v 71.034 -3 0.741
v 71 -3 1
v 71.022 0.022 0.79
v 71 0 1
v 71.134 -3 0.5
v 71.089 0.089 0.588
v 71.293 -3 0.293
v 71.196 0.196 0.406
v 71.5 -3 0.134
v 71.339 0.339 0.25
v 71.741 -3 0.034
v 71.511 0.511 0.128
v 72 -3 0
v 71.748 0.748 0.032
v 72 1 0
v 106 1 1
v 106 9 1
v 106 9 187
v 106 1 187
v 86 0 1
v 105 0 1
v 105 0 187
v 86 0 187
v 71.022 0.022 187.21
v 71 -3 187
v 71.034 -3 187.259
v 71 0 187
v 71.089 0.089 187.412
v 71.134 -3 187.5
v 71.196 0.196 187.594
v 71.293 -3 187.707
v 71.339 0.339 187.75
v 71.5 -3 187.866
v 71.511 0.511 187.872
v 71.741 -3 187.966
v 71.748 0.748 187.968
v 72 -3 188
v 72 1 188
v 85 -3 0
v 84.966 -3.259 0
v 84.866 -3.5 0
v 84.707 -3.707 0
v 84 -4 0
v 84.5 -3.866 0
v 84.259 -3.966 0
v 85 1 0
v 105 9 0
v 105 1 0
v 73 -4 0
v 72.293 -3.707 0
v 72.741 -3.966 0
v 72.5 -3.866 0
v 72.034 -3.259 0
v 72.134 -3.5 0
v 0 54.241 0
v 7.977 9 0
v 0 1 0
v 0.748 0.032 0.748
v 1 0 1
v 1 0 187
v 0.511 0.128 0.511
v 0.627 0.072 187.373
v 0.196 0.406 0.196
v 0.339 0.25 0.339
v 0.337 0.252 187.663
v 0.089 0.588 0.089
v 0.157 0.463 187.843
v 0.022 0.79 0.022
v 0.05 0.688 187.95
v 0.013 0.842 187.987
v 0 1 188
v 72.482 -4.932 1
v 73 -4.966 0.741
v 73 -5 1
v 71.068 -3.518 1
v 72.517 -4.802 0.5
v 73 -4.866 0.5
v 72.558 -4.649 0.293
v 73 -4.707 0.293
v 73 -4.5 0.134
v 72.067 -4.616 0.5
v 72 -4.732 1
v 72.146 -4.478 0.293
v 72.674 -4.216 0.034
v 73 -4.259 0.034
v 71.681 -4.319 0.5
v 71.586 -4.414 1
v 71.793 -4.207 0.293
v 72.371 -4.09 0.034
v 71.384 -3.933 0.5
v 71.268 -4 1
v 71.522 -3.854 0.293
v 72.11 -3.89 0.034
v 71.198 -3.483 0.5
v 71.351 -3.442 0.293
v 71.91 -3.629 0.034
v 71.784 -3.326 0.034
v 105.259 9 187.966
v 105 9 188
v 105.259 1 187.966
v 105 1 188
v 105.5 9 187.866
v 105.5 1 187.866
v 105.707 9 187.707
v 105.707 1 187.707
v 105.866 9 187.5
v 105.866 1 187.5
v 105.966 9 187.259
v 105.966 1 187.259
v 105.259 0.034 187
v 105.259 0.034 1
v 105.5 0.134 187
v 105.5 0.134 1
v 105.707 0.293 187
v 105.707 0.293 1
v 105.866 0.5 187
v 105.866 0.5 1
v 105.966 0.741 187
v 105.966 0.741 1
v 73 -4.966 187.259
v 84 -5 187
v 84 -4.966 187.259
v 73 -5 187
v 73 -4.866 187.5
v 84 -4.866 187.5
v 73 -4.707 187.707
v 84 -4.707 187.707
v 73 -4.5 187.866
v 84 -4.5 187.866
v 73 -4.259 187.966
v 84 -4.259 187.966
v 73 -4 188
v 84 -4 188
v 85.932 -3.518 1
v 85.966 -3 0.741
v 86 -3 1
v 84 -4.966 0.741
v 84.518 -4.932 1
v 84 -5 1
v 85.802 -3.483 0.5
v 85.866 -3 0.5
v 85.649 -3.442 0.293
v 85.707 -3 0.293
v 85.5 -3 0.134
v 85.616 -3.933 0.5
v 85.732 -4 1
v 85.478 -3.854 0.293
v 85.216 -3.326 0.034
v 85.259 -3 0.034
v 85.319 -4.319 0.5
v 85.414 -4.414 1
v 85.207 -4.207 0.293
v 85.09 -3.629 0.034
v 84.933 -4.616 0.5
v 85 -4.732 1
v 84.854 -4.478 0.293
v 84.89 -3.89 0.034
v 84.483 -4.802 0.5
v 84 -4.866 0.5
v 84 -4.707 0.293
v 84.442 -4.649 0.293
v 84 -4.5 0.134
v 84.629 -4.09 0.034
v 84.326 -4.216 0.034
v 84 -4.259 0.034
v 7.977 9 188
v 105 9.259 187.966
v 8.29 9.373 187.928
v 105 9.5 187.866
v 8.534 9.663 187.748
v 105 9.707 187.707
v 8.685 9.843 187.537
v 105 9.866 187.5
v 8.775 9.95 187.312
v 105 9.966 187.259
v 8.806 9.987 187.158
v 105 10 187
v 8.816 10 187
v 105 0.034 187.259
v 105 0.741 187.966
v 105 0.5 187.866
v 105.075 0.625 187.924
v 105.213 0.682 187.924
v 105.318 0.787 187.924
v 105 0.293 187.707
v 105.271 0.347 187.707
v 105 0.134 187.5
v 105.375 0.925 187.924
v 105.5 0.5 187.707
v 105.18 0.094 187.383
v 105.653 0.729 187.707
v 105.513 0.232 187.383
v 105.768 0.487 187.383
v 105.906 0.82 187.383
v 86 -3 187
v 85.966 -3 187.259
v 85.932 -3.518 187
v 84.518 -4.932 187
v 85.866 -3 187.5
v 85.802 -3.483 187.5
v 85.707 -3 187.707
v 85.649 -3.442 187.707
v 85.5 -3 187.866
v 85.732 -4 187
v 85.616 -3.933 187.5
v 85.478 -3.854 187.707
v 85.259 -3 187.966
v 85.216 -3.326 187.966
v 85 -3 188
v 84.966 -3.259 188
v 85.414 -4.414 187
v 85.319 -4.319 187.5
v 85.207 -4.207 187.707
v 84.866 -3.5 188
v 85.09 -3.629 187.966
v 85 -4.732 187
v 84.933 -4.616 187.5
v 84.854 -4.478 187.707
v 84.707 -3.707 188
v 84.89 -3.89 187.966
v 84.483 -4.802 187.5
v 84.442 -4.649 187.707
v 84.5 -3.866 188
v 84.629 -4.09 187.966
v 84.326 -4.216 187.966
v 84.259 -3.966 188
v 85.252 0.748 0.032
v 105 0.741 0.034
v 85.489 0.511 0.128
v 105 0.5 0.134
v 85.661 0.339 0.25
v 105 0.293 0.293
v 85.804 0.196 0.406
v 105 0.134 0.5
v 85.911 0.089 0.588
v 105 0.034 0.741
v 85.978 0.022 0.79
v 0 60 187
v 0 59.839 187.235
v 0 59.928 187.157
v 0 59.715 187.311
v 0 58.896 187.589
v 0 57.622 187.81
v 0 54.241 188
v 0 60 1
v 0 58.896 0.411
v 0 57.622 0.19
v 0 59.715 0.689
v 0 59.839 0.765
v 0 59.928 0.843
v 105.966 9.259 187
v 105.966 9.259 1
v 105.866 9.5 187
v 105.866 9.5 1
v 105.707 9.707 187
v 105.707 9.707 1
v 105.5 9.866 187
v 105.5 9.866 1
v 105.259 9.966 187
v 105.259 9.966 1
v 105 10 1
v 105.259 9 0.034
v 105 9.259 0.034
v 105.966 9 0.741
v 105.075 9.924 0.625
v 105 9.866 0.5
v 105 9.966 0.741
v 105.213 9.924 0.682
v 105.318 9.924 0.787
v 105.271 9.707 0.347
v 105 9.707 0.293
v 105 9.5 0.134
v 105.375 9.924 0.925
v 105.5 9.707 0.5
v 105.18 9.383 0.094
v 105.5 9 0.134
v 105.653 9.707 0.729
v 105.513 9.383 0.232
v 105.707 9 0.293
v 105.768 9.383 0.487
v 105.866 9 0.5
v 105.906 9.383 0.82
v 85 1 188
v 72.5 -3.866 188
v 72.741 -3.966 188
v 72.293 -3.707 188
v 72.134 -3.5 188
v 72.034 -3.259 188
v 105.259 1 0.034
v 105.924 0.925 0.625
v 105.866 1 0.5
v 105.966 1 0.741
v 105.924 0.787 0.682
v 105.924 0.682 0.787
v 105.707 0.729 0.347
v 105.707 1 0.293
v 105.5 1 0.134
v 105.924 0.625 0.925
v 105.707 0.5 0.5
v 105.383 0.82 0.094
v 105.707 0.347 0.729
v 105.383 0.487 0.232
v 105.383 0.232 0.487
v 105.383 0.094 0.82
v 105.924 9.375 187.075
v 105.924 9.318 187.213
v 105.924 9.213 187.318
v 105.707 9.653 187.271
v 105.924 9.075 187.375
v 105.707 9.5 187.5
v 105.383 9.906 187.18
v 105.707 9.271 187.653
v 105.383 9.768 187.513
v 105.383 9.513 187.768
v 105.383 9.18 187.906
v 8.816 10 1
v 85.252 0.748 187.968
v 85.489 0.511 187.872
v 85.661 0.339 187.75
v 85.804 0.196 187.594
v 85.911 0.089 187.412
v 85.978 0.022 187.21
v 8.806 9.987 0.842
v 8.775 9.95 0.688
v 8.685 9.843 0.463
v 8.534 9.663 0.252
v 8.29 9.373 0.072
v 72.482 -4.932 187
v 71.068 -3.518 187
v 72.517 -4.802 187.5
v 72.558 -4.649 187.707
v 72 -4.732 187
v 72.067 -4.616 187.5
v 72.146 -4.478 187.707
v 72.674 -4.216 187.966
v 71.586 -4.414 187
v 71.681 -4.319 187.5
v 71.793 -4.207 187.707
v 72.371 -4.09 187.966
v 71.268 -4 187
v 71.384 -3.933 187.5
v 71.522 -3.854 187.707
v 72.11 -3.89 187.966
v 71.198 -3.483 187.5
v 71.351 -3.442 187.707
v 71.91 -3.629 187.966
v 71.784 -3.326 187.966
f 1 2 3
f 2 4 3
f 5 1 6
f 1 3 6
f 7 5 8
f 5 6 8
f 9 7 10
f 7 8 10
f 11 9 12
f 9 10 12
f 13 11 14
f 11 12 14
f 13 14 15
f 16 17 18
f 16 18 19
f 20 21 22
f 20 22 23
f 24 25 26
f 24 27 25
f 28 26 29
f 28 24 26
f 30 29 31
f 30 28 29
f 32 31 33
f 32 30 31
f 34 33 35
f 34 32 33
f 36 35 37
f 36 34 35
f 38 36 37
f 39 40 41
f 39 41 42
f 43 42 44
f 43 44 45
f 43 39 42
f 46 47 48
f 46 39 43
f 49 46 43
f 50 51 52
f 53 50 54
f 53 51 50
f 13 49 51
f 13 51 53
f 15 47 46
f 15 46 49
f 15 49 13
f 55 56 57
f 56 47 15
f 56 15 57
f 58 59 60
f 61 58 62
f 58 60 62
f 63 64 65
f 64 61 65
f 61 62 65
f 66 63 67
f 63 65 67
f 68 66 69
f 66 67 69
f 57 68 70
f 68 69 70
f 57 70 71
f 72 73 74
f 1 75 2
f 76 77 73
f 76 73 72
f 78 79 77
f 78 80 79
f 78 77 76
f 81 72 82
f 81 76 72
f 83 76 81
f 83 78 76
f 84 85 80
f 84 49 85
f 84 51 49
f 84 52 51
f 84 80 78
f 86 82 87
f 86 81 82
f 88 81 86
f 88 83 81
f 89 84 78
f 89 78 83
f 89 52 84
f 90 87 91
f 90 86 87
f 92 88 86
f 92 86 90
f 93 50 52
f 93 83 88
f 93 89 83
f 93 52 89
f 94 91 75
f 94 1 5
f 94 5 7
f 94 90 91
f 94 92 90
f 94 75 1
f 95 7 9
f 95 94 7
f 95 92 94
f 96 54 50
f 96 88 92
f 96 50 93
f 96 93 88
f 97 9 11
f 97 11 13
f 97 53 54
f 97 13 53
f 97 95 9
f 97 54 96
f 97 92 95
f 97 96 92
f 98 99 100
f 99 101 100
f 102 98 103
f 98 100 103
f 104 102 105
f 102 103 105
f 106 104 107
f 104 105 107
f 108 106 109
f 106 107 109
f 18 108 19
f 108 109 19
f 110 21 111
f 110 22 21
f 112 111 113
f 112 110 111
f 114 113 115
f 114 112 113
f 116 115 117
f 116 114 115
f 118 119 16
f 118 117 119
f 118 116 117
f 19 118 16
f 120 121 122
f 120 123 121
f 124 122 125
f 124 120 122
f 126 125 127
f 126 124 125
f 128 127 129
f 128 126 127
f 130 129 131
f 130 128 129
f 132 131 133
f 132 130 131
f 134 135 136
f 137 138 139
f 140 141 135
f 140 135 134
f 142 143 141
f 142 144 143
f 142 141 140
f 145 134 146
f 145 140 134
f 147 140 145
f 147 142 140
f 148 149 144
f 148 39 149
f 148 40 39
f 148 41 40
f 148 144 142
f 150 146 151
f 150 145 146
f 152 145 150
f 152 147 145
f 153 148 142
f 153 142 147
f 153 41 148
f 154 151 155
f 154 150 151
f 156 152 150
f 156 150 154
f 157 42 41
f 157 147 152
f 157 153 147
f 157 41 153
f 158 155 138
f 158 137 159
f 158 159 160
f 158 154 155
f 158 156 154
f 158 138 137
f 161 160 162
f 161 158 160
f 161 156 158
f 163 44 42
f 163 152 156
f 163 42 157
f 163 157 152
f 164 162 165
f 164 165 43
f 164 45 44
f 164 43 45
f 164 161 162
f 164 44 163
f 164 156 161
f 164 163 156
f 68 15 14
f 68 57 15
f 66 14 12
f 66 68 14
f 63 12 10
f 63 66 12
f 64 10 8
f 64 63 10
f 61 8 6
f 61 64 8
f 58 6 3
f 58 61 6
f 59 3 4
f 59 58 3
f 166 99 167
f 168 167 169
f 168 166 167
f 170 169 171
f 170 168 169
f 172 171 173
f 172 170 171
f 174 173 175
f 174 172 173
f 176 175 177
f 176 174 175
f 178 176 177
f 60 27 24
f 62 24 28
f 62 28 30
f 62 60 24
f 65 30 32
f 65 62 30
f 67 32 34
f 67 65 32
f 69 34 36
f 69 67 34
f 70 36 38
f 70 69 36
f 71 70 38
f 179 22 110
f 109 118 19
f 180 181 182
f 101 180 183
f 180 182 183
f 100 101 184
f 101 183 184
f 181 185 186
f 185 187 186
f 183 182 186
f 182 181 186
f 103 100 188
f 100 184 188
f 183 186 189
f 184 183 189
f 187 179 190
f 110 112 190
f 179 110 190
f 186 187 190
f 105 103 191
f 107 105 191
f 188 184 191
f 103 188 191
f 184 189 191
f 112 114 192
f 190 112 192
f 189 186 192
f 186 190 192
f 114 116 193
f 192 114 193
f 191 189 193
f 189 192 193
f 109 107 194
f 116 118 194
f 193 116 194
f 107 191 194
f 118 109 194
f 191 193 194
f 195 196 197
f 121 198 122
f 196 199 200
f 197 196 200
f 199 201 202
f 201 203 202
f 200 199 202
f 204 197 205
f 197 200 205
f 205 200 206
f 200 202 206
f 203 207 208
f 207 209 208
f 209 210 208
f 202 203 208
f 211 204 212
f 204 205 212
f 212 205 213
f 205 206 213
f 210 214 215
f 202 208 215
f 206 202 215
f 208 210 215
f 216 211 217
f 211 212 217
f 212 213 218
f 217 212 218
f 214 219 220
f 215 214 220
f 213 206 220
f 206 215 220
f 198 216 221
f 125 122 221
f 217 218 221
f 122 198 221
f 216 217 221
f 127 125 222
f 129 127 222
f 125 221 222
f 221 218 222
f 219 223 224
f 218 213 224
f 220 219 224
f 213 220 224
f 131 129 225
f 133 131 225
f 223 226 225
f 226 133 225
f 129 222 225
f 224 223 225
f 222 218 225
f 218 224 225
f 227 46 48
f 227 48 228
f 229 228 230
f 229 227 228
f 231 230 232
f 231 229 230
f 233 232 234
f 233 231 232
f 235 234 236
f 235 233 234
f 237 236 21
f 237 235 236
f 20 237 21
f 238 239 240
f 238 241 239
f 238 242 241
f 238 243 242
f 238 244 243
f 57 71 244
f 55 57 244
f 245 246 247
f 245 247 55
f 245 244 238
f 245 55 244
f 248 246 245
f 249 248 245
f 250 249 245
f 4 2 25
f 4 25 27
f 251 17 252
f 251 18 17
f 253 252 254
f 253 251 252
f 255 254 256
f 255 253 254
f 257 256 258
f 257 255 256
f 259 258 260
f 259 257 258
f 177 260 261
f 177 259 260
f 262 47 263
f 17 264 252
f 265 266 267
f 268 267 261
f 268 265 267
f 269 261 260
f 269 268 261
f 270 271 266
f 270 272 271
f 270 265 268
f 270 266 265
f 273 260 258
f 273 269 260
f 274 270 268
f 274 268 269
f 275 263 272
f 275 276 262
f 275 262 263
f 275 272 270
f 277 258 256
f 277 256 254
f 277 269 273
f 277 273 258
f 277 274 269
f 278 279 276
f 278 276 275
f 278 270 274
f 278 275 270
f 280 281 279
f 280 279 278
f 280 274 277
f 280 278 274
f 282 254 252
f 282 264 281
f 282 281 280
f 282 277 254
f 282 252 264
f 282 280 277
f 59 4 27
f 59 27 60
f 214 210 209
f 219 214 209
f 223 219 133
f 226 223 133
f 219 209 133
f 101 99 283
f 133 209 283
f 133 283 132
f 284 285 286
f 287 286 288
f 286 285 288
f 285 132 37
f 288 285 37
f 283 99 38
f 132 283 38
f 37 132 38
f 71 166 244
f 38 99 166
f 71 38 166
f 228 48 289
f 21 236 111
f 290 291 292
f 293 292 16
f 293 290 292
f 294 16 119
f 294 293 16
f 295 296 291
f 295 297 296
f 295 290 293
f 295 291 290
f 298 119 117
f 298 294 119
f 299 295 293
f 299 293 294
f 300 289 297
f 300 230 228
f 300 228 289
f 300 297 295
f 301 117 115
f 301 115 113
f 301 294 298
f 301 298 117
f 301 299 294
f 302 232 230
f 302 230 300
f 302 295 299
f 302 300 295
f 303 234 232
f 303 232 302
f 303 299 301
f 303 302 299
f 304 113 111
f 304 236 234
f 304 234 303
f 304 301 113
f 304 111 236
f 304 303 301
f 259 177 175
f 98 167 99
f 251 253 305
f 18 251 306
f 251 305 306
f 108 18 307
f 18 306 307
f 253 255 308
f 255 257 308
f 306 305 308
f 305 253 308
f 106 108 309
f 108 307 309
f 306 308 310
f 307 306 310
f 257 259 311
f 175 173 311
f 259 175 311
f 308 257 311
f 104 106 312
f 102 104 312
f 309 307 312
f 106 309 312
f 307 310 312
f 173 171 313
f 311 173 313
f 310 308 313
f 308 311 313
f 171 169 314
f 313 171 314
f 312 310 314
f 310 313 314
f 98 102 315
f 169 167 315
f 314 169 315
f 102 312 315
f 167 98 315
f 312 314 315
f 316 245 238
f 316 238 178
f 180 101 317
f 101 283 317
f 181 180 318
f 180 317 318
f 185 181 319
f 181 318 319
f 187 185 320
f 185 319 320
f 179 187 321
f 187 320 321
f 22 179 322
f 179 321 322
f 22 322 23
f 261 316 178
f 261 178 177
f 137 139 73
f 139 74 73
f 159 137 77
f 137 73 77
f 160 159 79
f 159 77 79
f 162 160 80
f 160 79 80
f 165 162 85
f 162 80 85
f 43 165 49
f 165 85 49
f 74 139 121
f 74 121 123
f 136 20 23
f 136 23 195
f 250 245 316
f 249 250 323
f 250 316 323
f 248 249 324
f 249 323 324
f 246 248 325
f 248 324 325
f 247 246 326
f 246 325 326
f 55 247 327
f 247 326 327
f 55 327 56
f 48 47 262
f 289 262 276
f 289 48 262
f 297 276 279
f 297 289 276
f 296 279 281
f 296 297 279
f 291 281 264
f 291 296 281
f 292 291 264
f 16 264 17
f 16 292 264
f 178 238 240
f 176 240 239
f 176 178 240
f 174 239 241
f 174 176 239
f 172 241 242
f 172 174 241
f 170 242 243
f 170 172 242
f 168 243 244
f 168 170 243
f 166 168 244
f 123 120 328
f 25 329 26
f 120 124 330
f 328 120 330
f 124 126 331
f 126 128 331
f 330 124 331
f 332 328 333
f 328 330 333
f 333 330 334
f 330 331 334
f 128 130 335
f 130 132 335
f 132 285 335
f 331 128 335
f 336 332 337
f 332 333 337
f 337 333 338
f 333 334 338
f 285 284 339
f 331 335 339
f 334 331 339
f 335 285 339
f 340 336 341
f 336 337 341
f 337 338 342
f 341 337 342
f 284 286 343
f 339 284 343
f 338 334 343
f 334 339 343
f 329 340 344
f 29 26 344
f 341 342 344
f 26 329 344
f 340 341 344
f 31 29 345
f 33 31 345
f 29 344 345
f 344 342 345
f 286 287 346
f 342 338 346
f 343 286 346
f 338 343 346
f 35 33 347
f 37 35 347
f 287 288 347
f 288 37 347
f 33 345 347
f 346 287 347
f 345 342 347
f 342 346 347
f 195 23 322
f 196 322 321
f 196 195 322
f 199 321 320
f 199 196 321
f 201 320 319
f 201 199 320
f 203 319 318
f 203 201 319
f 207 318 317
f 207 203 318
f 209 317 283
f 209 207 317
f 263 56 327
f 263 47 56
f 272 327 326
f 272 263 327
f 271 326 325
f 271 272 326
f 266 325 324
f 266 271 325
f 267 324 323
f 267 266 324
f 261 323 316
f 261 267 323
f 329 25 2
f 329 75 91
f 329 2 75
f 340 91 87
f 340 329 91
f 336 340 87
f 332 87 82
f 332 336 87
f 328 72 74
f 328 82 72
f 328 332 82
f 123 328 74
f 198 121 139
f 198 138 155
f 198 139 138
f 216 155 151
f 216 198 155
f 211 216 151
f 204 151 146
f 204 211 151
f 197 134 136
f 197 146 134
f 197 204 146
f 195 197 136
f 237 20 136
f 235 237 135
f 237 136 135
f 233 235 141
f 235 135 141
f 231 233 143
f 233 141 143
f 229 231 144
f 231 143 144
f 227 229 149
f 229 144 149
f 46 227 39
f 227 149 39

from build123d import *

# Parameters (mm, degrees)
EXTRUDE_DEPTH = 188
FILLET_R      = 1
FILLET001_R   = 2
FILLET002_R   = 1


with BuildPart() as part:
    # Sketch → Extrude (new body)
    with BuildSketch(Plane.XY):
        Polygon((0, 0), (0, 60), (8.816349, 10), (106, 10), (106, 0), (86, 0), (86, -5), (71, -5), (71, 0), align=None)
    extrude(amount=EXTRUDE_DEPTH)

    # Fillet
    fillet_edges = [part.edges().sort_by_distance(p)[0] for p in [
        (4.408175, 35, 0),
        (4.408175, 35, 188),
    ]]
    fillet(fillet_edges, radius=FILLET_R)

    # Fillet001
    fillet001_edges = [part.edges().sort_by_distance(p)[0] for p in [
        (71, -5, 94),
        (86, -5, 94),
    ]]
    fillet(fillet001_edges, radius=FILLET001_R)

    # Fillet002
    fillet002_edges = [part.edges().sort_by_distance(p)[0] for p in [
        (71, -1.5, 0),
        (78.5, -5, 0),
        (86, -1.5, 0),
        (96, 0, 0),
        (106, 5, 0),
        (57.408175, 10, 0),
        (35.5, 0, 0),
        (71, -1.5, 188),
        (35.5, 0, 188),
        (0, 0, 94),
        (78.5, -5, 188),
        (86, -1.5, 188),
        (57.408175, 10, 188),
        (106, 10, 94),
        (106, 0, 94),
        (96, 0, 188),
        (106, 5, 188),
    ]]
    fillet(fillet002_edges, radius=FILLET002_R)


solid = part.part
